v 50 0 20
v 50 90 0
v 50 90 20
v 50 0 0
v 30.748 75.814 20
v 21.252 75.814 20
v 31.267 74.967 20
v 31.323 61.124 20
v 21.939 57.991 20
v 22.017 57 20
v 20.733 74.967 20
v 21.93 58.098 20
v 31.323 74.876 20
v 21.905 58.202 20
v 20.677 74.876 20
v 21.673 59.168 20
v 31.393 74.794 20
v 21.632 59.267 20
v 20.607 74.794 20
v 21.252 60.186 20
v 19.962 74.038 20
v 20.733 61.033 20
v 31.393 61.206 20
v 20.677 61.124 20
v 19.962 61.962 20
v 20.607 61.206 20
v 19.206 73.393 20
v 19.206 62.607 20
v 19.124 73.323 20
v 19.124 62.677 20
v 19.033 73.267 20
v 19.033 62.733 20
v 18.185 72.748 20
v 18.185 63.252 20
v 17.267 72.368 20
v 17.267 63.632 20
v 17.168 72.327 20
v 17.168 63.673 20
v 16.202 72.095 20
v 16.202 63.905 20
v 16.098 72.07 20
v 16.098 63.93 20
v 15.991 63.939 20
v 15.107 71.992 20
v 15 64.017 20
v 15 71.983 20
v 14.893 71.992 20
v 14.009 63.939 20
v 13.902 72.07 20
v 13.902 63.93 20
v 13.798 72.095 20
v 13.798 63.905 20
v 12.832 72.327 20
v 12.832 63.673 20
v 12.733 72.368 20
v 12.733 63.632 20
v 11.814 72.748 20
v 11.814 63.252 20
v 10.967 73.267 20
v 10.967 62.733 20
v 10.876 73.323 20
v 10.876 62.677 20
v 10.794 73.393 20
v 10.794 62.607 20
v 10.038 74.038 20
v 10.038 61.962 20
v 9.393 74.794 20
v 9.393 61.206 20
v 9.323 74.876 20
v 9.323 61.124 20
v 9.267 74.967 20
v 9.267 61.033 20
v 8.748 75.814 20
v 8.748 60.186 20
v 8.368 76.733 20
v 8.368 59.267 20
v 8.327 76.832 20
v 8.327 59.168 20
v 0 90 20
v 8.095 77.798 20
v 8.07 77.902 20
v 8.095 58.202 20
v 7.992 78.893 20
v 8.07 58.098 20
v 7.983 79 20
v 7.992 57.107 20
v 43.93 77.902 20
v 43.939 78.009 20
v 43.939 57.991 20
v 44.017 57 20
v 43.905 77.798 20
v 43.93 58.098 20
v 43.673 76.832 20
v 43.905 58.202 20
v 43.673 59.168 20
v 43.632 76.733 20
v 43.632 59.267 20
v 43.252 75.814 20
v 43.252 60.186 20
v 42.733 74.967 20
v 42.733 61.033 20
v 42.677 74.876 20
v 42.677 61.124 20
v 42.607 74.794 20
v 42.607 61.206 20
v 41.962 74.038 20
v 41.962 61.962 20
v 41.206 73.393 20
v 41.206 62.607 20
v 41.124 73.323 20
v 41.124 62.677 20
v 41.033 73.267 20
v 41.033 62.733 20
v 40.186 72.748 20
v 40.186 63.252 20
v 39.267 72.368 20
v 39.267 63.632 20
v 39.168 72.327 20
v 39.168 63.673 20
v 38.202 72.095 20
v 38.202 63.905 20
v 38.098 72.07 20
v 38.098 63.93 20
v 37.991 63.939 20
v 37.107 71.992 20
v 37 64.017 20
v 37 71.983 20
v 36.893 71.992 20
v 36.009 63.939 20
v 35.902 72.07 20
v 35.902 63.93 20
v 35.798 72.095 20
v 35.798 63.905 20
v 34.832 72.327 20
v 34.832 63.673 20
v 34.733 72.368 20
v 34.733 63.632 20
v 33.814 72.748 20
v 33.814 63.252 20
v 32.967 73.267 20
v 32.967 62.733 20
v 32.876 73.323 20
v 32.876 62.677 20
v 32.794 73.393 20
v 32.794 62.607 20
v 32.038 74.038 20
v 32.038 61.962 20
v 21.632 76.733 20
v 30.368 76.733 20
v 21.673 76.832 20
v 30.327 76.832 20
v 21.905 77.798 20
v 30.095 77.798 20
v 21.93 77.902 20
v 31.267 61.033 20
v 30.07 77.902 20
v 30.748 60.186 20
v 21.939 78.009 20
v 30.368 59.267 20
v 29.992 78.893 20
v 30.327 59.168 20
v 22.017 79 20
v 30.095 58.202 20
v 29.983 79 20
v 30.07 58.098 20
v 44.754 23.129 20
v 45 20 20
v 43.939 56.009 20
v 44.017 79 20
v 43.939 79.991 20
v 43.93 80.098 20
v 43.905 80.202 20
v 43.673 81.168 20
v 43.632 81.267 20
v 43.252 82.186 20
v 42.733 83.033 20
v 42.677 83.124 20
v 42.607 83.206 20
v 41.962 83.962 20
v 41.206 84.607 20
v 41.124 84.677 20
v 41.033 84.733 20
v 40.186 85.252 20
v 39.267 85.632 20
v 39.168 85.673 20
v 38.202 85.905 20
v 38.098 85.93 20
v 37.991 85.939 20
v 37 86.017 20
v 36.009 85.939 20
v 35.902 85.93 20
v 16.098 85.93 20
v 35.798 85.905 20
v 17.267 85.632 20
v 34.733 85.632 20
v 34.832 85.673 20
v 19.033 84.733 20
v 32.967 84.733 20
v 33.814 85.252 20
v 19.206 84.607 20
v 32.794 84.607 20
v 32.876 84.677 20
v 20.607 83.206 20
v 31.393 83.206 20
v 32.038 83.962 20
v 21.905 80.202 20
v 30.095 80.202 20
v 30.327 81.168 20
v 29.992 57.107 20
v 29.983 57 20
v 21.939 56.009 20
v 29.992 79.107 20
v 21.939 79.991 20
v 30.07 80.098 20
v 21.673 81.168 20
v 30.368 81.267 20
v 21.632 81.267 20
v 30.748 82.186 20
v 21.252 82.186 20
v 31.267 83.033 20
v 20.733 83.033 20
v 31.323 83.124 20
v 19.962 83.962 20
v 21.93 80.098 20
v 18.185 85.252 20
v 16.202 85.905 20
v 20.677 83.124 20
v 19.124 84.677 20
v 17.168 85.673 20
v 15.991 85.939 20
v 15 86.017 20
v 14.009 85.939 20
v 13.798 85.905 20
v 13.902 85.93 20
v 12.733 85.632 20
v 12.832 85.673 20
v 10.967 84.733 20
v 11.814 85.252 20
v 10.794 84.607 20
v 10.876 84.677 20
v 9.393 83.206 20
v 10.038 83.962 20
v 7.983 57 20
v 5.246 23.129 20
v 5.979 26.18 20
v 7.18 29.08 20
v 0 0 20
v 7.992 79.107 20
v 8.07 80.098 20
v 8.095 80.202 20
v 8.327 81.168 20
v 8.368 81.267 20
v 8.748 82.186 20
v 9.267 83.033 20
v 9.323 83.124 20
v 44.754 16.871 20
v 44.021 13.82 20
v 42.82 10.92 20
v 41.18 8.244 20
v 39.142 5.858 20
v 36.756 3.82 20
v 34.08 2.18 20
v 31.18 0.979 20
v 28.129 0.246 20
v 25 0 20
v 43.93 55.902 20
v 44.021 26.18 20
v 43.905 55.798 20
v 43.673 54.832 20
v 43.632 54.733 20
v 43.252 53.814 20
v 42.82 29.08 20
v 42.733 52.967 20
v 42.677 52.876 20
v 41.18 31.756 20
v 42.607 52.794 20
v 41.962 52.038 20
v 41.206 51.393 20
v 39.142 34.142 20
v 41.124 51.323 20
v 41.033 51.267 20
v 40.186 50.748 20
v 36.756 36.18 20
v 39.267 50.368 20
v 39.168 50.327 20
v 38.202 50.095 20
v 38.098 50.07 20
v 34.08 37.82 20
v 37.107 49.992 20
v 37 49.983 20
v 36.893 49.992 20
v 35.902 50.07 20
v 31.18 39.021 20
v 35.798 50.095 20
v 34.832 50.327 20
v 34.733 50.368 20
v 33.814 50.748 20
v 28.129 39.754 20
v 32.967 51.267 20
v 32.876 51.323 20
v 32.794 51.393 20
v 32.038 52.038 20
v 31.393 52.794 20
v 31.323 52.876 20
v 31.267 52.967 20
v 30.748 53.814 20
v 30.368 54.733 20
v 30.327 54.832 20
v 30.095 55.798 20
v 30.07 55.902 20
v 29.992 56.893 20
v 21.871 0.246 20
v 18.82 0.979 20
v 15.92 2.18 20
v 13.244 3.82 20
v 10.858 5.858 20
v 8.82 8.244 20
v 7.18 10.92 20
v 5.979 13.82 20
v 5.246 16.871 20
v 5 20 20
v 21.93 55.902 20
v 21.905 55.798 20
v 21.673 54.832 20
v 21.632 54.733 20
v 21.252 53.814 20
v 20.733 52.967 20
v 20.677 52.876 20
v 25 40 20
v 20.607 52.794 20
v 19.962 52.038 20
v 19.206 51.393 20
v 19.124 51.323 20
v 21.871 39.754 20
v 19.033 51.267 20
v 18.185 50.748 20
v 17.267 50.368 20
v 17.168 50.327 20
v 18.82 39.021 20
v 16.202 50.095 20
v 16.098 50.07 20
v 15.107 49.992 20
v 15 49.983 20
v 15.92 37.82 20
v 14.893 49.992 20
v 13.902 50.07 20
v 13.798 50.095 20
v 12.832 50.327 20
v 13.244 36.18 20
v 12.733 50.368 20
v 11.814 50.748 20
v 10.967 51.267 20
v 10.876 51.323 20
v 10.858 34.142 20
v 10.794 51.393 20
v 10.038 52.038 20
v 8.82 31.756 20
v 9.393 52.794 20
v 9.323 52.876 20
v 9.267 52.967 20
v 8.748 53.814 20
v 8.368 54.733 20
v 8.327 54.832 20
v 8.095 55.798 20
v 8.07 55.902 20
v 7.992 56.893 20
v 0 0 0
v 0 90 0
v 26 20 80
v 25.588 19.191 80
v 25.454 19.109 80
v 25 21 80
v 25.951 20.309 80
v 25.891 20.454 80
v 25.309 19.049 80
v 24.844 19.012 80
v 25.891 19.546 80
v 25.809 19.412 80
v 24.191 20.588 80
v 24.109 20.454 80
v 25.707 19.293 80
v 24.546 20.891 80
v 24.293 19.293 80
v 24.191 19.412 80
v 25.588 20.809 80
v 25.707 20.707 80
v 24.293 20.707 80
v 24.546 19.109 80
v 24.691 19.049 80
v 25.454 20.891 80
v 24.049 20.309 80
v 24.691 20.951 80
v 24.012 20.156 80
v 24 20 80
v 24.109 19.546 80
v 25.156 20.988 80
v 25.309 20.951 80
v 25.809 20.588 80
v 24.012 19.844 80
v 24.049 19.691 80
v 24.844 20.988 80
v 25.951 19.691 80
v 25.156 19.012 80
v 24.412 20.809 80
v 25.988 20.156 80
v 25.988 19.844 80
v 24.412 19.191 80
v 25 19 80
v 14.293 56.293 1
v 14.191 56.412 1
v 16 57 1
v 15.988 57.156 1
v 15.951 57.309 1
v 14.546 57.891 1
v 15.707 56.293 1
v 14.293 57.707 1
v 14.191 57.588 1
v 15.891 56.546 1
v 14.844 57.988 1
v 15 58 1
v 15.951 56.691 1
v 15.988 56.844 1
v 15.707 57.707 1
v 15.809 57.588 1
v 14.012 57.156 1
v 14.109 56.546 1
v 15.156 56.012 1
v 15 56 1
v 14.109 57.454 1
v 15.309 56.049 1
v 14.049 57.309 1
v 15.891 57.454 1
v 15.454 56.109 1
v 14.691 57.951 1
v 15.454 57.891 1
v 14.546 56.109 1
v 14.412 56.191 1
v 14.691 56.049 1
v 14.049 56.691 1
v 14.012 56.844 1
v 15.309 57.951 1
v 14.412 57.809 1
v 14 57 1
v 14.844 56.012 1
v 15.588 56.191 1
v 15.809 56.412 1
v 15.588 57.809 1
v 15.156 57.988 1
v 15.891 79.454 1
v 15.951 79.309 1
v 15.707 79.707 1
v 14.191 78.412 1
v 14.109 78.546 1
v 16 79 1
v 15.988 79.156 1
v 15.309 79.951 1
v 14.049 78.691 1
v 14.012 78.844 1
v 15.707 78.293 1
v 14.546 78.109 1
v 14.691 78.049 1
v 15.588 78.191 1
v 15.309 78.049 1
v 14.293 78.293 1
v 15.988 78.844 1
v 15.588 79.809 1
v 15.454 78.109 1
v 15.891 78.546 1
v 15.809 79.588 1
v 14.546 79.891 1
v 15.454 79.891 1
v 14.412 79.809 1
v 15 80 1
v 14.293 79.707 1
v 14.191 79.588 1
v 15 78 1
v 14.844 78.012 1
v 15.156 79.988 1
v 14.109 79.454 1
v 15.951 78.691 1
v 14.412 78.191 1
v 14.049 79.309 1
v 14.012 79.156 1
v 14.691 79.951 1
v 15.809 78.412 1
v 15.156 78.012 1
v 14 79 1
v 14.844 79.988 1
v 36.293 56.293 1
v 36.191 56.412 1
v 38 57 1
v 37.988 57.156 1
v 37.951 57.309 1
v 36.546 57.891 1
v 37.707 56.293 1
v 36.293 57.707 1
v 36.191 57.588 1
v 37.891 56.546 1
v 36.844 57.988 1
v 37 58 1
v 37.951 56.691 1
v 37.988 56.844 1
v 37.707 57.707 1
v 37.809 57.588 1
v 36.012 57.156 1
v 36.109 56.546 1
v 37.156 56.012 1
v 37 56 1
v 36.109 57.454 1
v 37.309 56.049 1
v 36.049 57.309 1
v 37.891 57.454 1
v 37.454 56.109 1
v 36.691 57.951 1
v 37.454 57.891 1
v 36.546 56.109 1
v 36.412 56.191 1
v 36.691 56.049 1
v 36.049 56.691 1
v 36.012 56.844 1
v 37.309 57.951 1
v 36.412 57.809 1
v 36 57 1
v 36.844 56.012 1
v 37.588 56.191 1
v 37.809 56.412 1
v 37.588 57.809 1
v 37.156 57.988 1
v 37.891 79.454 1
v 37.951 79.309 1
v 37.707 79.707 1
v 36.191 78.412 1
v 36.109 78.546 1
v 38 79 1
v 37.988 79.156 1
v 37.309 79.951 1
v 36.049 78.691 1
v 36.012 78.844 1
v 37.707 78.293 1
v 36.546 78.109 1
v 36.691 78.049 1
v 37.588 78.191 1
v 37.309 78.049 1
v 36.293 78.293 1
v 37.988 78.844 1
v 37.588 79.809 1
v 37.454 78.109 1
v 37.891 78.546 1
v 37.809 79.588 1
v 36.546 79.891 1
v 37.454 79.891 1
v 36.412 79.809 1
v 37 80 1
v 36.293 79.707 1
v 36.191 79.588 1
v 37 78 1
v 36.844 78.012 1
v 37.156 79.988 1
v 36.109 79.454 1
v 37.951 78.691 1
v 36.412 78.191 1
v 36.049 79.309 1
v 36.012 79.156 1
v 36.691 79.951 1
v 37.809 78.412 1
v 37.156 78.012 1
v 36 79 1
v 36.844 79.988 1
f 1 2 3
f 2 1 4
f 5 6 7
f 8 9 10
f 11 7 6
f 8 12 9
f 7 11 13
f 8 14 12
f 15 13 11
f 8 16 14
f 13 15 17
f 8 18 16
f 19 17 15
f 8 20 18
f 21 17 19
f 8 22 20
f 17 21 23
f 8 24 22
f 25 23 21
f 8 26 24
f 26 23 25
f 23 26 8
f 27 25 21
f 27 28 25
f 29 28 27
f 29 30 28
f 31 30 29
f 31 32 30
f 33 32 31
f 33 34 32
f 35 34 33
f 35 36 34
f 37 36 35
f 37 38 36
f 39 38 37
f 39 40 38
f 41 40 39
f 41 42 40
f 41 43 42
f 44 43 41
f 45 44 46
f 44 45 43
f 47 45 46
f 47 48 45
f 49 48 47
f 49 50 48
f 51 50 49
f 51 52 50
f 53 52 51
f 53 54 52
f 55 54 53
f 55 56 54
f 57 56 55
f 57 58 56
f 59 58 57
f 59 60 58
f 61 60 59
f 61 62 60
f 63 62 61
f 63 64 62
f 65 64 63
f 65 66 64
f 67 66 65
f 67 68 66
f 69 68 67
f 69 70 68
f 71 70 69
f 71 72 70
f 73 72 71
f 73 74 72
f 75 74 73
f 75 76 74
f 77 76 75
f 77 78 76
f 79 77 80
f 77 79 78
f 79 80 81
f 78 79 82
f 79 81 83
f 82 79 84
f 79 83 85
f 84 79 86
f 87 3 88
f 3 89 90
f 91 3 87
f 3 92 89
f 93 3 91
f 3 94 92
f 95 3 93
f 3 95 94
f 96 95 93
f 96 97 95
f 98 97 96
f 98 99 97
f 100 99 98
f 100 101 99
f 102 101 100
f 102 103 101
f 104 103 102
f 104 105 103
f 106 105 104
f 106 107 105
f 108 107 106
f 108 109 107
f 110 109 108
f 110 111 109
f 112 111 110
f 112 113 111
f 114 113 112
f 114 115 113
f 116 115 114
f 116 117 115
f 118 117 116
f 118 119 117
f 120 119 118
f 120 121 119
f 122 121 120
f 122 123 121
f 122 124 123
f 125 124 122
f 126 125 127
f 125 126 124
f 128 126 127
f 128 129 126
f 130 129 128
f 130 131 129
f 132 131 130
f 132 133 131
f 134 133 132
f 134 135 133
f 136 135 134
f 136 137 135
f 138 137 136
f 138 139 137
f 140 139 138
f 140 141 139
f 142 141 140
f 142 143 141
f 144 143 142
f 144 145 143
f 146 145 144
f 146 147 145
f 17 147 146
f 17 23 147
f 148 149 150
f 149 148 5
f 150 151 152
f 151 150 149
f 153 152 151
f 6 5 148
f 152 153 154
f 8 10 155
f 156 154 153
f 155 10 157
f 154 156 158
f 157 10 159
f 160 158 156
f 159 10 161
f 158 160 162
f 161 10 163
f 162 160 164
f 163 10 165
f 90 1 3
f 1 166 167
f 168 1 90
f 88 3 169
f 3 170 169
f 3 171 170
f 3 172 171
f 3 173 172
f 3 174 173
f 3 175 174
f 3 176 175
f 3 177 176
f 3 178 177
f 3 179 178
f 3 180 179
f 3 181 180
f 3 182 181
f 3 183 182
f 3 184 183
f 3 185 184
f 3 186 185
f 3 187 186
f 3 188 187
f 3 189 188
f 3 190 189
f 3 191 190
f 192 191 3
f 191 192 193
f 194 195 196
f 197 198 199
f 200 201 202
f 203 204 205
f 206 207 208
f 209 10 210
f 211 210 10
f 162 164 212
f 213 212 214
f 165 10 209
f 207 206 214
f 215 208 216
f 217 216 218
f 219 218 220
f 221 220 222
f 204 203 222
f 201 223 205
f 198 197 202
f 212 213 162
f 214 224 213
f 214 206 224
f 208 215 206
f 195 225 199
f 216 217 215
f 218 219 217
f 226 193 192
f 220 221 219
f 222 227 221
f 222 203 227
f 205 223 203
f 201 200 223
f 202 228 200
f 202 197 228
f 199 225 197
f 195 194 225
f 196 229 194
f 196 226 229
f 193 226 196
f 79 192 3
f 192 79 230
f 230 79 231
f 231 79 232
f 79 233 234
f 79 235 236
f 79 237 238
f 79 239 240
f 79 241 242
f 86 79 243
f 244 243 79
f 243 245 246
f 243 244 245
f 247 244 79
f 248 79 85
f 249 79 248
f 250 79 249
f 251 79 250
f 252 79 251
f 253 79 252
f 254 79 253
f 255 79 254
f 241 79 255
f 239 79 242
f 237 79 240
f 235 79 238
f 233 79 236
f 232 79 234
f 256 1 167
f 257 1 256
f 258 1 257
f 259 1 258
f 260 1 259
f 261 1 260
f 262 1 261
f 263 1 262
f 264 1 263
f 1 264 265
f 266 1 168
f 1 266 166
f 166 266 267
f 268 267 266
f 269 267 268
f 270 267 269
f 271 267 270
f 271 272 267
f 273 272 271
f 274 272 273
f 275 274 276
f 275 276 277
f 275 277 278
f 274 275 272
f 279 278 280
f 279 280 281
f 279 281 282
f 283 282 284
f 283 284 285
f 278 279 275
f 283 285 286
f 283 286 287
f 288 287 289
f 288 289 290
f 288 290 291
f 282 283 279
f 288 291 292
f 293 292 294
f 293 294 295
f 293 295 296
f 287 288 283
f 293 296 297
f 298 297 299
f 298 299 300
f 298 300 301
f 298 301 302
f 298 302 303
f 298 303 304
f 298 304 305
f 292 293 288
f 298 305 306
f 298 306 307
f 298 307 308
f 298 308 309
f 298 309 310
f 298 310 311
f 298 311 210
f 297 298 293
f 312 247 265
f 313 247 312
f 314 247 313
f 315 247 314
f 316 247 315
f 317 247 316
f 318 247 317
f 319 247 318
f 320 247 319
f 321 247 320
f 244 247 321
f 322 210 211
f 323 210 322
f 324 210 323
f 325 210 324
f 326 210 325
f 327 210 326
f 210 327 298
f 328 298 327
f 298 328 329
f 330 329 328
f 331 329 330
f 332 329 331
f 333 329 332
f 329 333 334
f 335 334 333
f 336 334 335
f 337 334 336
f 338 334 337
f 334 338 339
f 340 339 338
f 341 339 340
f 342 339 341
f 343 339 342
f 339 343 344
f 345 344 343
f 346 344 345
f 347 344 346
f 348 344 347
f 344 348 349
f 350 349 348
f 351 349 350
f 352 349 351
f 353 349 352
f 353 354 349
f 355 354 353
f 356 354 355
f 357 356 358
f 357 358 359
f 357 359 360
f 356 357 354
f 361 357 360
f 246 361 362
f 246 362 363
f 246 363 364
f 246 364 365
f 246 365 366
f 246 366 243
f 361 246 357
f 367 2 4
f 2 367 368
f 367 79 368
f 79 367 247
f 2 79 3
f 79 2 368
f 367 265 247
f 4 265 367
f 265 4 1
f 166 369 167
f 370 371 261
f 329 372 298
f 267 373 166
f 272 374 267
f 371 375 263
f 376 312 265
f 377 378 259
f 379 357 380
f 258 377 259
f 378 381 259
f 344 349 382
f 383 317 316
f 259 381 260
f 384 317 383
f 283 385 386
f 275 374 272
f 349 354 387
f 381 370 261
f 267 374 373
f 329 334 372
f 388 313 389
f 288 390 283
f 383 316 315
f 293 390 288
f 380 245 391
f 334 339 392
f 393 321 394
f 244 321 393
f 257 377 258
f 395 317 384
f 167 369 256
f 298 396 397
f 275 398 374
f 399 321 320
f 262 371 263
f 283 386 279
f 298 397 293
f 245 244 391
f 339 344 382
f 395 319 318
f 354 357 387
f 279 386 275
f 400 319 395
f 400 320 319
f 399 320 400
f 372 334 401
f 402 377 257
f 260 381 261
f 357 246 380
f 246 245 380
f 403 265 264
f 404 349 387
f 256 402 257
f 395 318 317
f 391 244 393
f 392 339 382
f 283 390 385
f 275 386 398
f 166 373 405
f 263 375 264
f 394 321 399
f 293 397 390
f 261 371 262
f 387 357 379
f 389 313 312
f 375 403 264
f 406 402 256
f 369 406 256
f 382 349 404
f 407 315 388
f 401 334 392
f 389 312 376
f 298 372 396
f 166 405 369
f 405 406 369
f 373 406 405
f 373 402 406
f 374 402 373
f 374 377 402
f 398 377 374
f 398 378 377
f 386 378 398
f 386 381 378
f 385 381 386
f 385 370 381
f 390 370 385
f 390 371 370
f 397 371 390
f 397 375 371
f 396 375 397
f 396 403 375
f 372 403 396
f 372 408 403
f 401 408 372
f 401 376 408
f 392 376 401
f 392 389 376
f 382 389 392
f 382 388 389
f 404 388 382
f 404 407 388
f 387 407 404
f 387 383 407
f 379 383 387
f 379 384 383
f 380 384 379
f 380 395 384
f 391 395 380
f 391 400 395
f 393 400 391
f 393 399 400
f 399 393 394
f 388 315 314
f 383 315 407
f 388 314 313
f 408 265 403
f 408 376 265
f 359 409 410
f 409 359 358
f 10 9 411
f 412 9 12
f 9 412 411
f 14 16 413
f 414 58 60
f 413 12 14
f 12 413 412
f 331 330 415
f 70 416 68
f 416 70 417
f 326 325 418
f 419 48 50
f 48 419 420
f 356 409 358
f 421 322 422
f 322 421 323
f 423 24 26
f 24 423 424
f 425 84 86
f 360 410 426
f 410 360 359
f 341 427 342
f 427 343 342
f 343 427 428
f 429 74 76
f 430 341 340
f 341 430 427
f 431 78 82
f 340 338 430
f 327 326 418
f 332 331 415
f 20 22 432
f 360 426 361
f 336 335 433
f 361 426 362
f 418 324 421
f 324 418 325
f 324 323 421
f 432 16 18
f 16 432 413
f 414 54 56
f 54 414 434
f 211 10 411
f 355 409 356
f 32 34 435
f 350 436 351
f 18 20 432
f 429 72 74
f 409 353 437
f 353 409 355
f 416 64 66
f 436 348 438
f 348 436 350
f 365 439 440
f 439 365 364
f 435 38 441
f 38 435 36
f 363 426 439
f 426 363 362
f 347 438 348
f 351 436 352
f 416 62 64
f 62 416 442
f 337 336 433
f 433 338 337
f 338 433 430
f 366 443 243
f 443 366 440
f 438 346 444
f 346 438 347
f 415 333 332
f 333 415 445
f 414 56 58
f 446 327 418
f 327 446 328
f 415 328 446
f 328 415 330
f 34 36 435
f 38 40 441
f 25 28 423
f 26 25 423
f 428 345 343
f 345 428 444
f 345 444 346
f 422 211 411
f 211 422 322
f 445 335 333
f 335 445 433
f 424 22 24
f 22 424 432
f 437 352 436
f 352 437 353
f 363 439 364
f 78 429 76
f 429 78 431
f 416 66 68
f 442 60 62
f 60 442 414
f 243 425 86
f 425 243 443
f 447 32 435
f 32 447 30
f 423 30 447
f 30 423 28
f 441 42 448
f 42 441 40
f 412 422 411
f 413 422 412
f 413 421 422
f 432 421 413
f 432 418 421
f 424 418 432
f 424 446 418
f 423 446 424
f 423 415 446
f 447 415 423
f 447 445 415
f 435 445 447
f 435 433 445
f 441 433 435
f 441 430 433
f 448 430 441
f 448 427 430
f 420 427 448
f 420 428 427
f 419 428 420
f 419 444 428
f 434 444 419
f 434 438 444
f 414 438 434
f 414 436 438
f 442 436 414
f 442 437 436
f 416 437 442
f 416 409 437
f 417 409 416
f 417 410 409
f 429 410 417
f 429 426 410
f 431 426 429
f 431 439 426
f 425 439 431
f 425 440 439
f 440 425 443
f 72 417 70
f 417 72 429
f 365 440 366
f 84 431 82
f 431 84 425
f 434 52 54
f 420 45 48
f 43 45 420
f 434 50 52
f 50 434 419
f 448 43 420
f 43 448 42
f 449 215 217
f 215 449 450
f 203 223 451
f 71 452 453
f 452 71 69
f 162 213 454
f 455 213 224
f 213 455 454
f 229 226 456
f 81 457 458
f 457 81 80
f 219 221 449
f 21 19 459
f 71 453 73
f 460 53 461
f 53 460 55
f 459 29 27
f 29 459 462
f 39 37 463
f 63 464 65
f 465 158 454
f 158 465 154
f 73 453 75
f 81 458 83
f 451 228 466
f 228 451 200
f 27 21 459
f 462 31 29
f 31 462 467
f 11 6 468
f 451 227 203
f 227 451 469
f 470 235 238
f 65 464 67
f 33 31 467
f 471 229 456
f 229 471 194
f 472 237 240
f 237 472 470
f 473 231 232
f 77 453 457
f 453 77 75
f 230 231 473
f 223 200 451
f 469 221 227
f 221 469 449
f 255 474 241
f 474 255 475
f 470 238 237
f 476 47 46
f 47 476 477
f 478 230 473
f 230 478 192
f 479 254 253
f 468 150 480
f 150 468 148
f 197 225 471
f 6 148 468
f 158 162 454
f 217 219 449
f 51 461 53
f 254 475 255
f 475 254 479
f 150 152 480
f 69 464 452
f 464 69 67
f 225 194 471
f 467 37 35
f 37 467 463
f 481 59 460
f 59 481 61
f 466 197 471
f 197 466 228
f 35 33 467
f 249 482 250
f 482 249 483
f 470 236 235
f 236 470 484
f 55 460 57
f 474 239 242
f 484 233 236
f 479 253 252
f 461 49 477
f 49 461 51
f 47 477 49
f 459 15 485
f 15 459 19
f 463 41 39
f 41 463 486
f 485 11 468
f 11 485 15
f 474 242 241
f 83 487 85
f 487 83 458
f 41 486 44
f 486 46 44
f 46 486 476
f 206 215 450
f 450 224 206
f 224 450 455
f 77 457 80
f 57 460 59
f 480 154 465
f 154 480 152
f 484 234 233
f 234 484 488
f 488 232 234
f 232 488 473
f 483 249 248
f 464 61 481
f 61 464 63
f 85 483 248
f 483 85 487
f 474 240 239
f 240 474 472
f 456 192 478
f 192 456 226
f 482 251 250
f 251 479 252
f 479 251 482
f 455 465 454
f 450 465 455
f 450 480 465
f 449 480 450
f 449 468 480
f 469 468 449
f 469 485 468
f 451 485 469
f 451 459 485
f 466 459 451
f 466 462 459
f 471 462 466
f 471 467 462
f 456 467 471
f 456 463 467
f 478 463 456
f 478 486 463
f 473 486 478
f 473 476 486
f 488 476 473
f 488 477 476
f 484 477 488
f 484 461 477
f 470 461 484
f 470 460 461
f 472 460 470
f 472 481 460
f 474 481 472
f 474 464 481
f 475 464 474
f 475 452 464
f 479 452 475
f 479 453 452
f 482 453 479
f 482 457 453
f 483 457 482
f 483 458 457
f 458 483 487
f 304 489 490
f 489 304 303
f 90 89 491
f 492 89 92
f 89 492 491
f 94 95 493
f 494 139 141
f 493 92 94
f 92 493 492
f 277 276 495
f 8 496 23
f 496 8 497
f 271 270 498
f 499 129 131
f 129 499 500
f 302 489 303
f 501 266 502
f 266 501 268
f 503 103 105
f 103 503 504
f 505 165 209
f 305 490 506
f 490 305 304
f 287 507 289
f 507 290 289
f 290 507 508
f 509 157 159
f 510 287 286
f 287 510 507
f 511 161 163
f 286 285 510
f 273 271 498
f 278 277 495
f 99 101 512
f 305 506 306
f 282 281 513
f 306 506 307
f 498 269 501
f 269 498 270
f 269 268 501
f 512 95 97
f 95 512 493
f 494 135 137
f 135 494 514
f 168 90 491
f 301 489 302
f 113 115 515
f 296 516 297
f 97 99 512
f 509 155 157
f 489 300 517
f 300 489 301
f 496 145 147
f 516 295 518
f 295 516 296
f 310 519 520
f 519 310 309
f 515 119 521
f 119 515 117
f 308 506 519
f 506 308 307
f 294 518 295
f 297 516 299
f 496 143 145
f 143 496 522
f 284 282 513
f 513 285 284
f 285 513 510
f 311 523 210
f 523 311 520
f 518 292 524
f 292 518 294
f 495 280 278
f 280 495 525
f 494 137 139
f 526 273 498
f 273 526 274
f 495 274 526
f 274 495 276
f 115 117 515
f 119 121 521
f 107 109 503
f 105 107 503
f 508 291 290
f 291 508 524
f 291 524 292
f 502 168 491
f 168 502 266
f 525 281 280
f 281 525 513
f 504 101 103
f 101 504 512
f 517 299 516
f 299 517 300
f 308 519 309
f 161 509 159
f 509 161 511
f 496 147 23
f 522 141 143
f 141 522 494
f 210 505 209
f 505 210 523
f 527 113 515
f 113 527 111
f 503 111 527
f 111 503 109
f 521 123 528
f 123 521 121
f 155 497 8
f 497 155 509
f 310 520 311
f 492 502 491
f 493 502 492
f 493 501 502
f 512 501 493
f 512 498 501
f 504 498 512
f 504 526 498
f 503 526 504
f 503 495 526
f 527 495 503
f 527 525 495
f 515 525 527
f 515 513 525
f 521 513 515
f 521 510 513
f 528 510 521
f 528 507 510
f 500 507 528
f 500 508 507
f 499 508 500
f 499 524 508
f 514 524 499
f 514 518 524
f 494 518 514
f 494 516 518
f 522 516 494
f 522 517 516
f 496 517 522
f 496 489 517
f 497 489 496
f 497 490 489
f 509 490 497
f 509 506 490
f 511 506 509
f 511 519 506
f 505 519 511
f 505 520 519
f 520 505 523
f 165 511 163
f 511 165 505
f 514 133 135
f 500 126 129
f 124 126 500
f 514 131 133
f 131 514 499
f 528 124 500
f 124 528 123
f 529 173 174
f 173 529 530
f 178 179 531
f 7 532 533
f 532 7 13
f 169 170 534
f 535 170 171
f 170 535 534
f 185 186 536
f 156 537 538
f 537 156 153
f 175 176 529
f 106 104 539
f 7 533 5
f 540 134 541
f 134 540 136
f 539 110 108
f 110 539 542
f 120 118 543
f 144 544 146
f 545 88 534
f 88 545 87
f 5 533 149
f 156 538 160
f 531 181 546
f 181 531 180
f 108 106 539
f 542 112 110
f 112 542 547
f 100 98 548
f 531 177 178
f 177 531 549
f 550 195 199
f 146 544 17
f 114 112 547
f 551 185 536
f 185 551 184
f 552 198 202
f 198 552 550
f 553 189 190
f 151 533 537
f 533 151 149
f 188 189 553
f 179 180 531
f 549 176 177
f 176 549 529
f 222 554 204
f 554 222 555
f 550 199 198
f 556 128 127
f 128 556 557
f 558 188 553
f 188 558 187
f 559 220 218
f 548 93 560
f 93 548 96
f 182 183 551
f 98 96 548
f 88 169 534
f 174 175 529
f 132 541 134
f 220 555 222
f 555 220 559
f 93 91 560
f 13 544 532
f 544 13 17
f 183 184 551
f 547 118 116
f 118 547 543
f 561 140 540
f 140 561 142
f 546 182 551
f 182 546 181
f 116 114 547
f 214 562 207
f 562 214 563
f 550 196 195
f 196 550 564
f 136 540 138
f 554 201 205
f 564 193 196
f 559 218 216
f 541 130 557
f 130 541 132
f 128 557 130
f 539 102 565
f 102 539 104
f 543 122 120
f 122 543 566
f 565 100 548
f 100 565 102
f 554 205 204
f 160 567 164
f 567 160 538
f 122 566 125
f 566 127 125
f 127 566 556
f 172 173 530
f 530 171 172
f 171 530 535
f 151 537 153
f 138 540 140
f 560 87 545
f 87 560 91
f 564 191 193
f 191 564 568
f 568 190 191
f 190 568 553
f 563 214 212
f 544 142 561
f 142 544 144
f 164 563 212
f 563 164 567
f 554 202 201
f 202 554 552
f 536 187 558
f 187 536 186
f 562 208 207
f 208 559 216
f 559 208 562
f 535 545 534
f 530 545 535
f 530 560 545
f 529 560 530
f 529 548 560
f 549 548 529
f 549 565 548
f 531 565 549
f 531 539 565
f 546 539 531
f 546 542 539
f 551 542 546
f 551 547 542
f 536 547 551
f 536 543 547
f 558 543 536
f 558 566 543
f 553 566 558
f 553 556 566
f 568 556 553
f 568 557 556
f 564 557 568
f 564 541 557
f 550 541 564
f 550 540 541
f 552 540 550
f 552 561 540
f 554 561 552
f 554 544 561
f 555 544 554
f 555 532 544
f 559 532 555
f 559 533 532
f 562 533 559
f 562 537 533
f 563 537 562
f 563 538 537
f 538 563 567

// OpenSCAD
height = 20;
width = 50;
length = 90;
module block(){
  union(){
    cube([width,length,height]);
    translate([width/2,20,height])
      cylinder(h=60, r1=20, r2=1, $fn=40);
  }
}

d = 22;
difference(){
  block();
  for(x=[d-7,d*2-7]) 
    for(y=[d+35,d*2+35])
      translate([x,y,1]) 
        cylinder(h=60, r1=1, r2=20, center=false, $fn=40);
}
